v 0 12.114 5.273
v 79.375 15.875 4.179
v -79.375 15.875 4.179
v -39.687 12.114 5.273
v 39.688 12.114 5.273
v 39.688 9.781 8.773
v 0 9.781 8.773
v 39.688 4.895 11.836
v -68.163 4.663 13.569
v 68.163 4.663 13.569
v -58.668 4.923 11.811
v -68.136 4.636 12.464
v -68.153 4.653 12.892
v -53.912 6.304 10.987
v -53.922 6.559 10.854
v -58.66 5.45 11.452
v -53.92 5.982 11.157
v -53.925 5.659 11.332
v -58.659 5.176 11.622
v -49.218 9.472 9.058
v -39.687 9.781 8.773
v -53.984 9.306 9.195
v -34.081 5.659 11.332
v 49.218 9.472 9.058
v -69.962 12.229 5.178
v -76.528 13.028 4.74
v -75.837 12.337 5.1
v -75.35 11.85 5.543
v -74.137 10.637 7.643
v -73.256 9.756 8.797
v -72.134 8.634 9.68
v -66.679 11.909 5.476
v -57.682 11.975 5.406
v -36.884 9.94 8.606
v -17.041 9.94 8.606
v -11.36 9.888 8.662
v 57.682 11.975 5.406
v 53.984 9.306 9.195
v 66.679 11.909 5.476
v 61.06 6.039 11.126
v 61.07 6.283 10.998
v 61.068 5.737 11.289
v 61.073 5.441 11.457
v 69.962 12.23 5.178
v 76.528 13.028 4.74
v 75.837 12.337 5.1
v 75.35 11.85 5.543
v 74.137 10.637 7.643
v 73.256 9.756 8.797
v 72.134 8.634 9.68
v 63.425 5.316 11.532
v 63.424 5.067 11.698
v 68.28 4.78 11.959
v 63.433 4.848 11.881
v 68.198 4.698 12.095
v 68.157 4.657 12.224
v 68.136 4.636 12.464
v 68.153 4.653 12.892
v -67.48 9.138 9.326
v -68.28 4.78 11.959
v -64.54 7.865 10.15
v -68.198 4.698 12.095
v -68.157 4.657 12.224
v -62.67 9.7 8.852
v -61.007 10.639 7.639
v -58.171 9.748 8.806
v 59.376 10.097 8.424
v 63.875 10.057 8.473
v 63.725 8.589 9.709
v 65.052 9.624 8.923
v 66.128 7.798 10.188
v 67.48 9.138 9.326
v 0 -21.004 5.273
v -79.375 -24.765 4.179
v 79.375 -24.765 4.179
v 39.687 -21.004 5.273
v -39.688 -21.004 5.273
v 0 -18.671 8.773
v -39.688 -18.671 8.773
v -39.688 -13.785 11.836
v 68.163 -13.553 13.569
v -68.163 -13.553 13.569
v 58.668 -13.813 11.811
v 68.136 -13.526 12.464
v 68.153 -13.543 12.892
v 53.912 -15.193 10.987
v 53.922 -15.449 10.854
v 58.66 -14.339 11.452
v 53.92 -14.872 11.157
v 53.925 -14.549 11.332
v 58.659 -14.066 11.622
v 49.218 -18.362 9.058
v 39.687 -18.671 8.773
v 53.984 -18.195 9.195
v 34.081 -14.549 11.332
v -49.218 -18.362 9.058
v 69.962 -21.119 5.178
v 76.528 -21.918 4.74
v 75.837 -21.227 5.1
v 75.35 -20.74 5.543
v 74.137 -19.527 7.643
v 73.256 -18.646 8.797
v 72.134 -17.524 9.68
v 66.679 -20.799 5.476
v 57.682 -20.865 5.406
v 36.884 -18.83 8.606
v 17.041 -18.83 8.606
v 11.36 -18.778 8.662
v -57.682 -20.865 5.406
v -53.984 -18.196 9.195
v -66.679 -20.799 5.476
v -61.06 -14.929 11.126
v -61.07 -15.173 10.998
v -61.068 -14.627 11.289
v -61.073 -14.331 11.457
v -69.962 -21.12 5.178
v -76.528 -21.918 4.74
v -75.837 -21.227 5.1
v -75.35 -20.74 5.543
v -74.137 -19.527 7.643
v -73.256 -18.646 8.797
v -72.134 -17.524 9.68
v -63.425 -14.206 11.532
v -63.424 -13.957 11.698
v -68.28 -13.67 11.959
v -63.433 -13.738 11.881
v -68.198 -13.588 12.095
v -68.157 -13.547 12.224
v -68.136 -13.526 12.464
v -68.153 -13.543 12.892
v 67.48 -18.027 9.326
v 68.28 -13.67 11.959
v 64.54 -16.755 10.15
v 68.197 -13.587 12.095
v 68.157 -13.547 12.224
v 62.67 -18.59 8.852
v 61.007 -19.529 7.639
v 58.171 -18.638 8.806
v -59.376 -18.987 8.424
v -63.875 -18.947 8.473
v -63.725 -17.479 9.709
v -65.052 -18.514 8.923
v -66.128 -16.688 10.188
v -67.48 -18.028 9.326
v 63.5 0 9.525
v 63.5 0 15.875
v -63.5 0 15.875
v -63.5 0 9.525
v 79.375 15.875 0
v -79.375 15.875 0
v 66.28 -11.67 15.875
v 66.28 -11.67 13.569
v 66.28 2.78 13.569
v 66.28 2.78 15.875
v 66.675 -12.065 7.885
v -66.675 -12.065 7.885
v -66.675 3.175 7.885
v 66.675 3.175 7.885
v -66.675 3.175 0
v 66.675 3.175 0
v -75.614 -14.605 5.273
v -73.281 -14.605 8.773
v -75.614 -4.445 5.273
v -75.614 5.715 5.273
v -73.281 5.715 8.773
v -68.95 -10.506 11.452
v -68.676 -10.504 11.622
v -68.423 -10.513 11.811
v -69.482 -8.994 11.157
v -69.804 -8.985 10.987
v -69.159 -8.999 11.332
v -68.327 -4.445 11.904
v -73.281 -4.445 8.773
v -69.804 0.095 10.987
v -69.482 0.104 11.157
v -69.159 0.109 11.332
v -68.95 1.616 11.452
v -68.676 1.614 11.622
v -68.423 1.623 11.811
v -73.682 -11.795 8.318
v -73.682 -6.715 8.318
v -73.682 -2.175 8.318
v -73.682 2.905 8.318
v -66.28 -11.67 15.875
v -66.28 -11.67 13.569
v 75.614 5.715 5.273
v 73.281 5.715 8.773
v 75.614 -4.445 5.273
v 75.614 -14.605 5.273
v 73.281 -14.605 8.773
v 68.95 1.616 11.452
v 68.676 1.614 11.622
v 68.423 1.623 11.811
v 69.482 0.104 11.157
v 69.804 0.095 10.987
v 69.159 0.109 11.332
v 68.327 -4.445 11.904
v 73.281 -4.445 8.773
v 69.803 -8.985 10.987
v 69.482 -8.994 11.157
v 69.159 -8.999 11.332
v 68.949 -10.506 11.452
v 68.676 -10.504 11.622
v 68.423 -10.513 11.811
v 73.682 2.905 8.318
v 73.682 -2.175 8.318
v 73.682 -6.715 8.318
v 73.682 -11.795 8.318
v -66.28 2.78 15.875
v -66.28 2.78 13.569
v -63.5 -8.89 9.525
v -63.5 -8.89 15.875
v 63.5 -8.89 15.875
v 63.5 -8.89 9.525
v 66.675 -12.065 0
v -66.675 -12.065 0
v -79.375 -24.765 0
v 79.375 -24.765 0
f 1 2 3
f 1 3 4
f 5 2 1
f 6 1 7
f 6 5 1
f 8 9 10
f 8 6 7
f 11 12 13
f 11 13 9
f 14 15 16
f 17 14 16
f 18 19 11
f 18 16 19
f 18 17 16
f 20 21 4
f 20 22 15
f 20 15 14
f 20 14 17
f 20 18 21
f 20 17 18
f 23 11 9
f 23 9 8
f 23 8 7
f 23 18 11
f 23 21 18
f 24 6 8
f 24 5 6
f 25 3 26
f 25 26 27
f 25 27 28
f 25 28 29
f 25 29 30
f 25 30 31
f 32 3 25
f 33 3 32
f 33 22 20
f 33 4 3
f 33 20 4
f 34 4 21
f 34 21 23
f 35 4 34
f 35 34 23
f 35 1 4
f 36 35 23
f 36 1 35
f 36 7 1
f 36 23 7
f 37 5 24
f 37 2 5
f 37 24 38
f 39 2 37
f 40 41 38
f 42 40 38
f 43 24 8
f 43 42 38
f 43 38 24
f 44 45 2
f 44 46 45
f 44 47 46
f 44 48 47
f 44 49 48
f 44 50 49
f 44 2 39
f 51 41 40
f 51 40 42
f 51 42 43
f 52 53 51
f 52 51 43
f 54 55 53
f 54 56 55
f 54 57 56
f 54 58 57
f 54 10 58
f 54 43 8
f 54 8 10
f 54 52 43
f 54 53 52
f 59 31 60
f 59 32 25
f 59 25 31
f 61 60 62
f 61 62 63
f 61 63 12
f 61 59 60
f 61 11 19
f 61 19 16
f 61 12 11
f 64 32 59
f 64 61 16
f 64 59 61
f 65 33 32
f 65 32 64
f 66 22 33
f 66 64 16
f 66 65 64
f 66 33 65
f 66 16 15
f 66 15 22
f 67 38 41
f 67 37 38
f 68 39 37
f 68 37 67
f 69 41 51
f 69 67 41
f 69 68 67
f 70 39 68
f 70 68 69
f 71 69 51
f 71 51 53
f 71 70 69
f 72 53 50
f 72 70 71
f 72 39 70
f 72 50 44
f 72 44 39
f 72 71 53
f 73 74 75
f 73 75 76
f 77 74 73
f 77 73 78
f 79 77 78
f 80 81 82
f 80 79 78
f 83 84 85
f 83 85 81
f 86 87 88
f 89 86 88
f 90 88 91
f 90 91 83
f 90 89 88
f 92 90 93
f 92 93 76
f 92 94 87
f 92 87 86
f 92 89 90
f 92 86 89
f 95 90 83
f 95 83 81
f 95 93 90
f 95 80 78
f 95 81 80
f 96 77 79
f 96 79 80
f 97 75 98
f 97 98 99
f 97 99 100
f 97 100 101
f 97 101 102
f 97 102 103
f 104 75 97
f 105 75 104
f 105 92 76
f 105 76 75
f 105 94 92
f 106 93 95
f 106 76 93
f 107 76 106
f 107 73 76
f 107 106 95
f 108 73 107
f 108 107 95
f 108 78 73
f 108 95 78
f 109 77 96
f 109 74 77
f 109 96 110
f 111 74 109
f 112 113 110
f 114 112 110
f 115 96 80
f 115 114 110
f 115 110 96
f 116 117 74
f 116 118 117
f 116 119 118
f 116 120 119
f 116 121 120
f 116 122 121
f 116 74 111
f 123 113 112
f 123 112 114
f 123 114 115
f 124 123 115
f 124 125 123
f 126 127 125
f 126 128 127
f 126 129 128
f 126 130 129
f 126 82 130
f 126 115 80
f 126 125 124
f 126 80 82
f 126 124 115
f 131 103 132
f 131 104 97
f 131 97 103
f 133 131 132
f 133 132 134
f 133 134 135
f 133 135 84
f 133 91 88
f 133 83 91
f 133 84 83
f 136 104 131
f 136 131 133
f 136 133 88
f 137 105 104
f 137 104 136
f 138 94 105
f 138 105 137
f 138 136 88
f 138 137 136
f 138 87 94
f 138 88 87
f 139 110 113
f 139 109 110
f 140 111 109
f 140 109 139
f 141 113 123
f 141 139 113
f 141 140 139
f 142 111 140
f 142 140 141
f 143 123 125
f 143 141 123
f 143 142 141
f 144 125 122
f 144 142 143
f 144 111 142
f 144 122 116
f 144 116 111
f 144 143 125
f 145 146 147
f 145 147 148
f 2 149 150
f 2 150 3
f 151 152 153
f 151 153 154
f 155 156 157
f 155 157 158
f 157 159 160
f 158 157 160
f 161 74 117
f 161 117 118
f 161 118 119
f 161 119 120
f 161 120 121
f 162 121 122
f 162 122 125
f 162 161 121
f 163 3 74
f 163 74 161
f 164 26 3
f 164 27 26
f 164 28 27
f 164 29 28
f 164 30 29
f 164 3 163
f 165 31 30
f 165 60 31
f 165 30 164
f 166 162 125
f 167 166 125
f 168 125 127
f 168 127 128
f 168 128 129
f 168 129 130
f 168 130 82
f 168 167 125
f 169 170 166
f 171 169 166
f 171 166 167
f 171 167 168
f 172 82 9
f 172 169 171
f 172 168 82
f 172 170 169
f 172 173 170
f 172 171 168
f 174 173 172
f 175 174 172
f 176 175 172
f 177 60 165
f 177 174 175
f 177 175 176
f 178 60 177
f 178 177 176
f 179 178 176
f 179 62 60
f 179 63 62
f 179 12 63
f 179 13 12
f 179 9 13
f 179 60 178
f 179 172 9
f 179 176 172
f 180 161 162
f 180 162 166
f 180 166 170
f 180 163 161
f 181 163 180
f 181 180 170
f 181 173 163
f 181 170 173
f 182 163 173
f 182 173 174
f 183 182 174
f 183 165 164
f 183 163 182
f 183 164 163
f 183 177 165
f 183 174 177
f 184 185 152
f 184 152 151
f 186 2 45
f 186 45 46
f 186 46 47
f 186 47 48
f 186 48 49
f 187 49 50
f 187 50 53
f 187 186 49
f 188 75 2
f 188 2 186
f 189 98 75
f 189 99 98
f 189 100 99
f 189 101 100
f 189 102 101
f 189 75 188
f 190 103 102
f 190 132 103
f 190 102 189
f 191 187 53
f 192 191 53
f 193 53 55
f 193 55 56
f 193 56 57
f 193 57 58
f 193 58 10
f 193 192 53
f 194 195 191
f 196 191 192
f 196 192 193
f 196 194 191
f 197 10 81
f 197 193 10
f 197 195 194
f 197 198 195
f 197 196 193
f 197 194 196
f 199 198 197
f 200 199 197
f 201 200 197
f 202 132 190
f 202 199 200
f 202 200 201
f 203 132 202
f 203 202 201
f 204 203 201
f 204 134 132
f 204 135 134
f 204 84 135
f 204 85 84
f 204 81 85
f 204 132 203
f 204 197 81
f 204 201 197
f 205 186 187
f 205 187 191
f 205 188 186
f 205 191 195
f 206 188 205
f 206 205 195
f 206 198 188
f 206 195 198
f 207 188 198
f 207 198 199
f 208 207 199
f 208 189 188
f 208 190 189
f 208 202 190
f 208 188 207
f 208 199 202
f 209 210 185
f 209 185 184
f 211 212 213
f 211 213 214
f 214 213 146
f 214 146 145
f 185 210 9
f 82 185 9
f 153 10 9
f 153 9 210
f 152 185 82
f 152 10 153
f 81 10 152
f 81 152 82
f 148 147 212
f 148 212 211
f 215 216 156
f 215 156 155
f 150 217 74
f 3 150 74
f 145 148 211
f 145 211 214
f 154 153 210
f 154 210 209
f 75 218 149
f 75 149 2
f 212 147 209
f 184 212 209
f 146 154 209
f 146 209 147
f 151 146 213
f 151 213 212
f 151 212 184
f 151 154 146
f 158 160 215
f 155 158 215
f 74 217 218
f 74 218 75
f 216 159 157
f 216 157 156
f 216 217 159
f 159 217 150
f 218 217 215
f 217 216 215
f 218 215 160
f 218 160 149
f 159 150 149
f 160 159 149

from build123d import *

# Parameters (mm, degrees)
F3_W     = 127
F3_H     = 8.89
F4_DEPTH = 9.525
F5_W     = 133.35
F5_H     = 15.24
F6_DEPTH = 7.88512


with BuildPart() as f2:
    # F2: sweep along a path in F0
    with BuildLine(Plane.XY) as f2_path:
        Line((-63.5, 0), (63.5, 0))
        Line((63.5, 0), (63.5, -8.89))
        Line((63.5, -8.89), (-63.5, -8.89))
        Line((-63.5, -8.89), (-63.5, 0))
    # F1 (on Right) → F2 (sweep)
    with BuildSketch(Plane.YZ):
        with BuildLine():
            Line((0, 4.178553988), (0, 0))
            Line((0, 0), (15.875, 0))
            Line((15.875, 0), (15.875, 4.178553988))
            add(Edge.make_bspline(
                [(15.875, 4.178553988), (14.5700791907, 4.3410316154), (11.3910350226, 4.6434039972), (10.7282030423, 9.3279482792), (4.1216189564, 11.7033571608), (4.6891846979, 12.4869055891), (4.6625201725, 13.5694751074)],
                knots=[0, 0, 0, 0, 0.2552340564, 0.5197508028, 0.8294424133, 1, 1, 1, 1], degree=3))
            Line((4.6625201725, 13.5694751074), (2.7802032419, 13.5694751074))
            Line((2.7802032419, 13.5694751074), (2.7802032419, 15.875))
            Line((2.7802032419, 15.875), (0, 15.875))
            Line((0, 15.875), (0, 4.178553988))
        make_face()
    sweep(path=f2_path.line, transition=Transition.RIGHT)

    # F3 (on Top) → F4 (join)
    with BuildSketch(Plane.XY):
        with Locations((0, -4.445)):
            Rectangle(F3_W, F3_H)
    extrude(amount=F4_DEPTH)

    # F5 (on face) → F6 (cut)
    with BuildSketch(Plane(origin=(0, 0, 0), x_dir=(1, 0, 0), z_dir=(0, 0, -1))):
        with Locations((0, 4.445)):
            Rectangle(F5_W, F5_H)
    extrude(amount=-F6_DEPTH, mode=Mode.SUBTRACT)


solid = f2.part
